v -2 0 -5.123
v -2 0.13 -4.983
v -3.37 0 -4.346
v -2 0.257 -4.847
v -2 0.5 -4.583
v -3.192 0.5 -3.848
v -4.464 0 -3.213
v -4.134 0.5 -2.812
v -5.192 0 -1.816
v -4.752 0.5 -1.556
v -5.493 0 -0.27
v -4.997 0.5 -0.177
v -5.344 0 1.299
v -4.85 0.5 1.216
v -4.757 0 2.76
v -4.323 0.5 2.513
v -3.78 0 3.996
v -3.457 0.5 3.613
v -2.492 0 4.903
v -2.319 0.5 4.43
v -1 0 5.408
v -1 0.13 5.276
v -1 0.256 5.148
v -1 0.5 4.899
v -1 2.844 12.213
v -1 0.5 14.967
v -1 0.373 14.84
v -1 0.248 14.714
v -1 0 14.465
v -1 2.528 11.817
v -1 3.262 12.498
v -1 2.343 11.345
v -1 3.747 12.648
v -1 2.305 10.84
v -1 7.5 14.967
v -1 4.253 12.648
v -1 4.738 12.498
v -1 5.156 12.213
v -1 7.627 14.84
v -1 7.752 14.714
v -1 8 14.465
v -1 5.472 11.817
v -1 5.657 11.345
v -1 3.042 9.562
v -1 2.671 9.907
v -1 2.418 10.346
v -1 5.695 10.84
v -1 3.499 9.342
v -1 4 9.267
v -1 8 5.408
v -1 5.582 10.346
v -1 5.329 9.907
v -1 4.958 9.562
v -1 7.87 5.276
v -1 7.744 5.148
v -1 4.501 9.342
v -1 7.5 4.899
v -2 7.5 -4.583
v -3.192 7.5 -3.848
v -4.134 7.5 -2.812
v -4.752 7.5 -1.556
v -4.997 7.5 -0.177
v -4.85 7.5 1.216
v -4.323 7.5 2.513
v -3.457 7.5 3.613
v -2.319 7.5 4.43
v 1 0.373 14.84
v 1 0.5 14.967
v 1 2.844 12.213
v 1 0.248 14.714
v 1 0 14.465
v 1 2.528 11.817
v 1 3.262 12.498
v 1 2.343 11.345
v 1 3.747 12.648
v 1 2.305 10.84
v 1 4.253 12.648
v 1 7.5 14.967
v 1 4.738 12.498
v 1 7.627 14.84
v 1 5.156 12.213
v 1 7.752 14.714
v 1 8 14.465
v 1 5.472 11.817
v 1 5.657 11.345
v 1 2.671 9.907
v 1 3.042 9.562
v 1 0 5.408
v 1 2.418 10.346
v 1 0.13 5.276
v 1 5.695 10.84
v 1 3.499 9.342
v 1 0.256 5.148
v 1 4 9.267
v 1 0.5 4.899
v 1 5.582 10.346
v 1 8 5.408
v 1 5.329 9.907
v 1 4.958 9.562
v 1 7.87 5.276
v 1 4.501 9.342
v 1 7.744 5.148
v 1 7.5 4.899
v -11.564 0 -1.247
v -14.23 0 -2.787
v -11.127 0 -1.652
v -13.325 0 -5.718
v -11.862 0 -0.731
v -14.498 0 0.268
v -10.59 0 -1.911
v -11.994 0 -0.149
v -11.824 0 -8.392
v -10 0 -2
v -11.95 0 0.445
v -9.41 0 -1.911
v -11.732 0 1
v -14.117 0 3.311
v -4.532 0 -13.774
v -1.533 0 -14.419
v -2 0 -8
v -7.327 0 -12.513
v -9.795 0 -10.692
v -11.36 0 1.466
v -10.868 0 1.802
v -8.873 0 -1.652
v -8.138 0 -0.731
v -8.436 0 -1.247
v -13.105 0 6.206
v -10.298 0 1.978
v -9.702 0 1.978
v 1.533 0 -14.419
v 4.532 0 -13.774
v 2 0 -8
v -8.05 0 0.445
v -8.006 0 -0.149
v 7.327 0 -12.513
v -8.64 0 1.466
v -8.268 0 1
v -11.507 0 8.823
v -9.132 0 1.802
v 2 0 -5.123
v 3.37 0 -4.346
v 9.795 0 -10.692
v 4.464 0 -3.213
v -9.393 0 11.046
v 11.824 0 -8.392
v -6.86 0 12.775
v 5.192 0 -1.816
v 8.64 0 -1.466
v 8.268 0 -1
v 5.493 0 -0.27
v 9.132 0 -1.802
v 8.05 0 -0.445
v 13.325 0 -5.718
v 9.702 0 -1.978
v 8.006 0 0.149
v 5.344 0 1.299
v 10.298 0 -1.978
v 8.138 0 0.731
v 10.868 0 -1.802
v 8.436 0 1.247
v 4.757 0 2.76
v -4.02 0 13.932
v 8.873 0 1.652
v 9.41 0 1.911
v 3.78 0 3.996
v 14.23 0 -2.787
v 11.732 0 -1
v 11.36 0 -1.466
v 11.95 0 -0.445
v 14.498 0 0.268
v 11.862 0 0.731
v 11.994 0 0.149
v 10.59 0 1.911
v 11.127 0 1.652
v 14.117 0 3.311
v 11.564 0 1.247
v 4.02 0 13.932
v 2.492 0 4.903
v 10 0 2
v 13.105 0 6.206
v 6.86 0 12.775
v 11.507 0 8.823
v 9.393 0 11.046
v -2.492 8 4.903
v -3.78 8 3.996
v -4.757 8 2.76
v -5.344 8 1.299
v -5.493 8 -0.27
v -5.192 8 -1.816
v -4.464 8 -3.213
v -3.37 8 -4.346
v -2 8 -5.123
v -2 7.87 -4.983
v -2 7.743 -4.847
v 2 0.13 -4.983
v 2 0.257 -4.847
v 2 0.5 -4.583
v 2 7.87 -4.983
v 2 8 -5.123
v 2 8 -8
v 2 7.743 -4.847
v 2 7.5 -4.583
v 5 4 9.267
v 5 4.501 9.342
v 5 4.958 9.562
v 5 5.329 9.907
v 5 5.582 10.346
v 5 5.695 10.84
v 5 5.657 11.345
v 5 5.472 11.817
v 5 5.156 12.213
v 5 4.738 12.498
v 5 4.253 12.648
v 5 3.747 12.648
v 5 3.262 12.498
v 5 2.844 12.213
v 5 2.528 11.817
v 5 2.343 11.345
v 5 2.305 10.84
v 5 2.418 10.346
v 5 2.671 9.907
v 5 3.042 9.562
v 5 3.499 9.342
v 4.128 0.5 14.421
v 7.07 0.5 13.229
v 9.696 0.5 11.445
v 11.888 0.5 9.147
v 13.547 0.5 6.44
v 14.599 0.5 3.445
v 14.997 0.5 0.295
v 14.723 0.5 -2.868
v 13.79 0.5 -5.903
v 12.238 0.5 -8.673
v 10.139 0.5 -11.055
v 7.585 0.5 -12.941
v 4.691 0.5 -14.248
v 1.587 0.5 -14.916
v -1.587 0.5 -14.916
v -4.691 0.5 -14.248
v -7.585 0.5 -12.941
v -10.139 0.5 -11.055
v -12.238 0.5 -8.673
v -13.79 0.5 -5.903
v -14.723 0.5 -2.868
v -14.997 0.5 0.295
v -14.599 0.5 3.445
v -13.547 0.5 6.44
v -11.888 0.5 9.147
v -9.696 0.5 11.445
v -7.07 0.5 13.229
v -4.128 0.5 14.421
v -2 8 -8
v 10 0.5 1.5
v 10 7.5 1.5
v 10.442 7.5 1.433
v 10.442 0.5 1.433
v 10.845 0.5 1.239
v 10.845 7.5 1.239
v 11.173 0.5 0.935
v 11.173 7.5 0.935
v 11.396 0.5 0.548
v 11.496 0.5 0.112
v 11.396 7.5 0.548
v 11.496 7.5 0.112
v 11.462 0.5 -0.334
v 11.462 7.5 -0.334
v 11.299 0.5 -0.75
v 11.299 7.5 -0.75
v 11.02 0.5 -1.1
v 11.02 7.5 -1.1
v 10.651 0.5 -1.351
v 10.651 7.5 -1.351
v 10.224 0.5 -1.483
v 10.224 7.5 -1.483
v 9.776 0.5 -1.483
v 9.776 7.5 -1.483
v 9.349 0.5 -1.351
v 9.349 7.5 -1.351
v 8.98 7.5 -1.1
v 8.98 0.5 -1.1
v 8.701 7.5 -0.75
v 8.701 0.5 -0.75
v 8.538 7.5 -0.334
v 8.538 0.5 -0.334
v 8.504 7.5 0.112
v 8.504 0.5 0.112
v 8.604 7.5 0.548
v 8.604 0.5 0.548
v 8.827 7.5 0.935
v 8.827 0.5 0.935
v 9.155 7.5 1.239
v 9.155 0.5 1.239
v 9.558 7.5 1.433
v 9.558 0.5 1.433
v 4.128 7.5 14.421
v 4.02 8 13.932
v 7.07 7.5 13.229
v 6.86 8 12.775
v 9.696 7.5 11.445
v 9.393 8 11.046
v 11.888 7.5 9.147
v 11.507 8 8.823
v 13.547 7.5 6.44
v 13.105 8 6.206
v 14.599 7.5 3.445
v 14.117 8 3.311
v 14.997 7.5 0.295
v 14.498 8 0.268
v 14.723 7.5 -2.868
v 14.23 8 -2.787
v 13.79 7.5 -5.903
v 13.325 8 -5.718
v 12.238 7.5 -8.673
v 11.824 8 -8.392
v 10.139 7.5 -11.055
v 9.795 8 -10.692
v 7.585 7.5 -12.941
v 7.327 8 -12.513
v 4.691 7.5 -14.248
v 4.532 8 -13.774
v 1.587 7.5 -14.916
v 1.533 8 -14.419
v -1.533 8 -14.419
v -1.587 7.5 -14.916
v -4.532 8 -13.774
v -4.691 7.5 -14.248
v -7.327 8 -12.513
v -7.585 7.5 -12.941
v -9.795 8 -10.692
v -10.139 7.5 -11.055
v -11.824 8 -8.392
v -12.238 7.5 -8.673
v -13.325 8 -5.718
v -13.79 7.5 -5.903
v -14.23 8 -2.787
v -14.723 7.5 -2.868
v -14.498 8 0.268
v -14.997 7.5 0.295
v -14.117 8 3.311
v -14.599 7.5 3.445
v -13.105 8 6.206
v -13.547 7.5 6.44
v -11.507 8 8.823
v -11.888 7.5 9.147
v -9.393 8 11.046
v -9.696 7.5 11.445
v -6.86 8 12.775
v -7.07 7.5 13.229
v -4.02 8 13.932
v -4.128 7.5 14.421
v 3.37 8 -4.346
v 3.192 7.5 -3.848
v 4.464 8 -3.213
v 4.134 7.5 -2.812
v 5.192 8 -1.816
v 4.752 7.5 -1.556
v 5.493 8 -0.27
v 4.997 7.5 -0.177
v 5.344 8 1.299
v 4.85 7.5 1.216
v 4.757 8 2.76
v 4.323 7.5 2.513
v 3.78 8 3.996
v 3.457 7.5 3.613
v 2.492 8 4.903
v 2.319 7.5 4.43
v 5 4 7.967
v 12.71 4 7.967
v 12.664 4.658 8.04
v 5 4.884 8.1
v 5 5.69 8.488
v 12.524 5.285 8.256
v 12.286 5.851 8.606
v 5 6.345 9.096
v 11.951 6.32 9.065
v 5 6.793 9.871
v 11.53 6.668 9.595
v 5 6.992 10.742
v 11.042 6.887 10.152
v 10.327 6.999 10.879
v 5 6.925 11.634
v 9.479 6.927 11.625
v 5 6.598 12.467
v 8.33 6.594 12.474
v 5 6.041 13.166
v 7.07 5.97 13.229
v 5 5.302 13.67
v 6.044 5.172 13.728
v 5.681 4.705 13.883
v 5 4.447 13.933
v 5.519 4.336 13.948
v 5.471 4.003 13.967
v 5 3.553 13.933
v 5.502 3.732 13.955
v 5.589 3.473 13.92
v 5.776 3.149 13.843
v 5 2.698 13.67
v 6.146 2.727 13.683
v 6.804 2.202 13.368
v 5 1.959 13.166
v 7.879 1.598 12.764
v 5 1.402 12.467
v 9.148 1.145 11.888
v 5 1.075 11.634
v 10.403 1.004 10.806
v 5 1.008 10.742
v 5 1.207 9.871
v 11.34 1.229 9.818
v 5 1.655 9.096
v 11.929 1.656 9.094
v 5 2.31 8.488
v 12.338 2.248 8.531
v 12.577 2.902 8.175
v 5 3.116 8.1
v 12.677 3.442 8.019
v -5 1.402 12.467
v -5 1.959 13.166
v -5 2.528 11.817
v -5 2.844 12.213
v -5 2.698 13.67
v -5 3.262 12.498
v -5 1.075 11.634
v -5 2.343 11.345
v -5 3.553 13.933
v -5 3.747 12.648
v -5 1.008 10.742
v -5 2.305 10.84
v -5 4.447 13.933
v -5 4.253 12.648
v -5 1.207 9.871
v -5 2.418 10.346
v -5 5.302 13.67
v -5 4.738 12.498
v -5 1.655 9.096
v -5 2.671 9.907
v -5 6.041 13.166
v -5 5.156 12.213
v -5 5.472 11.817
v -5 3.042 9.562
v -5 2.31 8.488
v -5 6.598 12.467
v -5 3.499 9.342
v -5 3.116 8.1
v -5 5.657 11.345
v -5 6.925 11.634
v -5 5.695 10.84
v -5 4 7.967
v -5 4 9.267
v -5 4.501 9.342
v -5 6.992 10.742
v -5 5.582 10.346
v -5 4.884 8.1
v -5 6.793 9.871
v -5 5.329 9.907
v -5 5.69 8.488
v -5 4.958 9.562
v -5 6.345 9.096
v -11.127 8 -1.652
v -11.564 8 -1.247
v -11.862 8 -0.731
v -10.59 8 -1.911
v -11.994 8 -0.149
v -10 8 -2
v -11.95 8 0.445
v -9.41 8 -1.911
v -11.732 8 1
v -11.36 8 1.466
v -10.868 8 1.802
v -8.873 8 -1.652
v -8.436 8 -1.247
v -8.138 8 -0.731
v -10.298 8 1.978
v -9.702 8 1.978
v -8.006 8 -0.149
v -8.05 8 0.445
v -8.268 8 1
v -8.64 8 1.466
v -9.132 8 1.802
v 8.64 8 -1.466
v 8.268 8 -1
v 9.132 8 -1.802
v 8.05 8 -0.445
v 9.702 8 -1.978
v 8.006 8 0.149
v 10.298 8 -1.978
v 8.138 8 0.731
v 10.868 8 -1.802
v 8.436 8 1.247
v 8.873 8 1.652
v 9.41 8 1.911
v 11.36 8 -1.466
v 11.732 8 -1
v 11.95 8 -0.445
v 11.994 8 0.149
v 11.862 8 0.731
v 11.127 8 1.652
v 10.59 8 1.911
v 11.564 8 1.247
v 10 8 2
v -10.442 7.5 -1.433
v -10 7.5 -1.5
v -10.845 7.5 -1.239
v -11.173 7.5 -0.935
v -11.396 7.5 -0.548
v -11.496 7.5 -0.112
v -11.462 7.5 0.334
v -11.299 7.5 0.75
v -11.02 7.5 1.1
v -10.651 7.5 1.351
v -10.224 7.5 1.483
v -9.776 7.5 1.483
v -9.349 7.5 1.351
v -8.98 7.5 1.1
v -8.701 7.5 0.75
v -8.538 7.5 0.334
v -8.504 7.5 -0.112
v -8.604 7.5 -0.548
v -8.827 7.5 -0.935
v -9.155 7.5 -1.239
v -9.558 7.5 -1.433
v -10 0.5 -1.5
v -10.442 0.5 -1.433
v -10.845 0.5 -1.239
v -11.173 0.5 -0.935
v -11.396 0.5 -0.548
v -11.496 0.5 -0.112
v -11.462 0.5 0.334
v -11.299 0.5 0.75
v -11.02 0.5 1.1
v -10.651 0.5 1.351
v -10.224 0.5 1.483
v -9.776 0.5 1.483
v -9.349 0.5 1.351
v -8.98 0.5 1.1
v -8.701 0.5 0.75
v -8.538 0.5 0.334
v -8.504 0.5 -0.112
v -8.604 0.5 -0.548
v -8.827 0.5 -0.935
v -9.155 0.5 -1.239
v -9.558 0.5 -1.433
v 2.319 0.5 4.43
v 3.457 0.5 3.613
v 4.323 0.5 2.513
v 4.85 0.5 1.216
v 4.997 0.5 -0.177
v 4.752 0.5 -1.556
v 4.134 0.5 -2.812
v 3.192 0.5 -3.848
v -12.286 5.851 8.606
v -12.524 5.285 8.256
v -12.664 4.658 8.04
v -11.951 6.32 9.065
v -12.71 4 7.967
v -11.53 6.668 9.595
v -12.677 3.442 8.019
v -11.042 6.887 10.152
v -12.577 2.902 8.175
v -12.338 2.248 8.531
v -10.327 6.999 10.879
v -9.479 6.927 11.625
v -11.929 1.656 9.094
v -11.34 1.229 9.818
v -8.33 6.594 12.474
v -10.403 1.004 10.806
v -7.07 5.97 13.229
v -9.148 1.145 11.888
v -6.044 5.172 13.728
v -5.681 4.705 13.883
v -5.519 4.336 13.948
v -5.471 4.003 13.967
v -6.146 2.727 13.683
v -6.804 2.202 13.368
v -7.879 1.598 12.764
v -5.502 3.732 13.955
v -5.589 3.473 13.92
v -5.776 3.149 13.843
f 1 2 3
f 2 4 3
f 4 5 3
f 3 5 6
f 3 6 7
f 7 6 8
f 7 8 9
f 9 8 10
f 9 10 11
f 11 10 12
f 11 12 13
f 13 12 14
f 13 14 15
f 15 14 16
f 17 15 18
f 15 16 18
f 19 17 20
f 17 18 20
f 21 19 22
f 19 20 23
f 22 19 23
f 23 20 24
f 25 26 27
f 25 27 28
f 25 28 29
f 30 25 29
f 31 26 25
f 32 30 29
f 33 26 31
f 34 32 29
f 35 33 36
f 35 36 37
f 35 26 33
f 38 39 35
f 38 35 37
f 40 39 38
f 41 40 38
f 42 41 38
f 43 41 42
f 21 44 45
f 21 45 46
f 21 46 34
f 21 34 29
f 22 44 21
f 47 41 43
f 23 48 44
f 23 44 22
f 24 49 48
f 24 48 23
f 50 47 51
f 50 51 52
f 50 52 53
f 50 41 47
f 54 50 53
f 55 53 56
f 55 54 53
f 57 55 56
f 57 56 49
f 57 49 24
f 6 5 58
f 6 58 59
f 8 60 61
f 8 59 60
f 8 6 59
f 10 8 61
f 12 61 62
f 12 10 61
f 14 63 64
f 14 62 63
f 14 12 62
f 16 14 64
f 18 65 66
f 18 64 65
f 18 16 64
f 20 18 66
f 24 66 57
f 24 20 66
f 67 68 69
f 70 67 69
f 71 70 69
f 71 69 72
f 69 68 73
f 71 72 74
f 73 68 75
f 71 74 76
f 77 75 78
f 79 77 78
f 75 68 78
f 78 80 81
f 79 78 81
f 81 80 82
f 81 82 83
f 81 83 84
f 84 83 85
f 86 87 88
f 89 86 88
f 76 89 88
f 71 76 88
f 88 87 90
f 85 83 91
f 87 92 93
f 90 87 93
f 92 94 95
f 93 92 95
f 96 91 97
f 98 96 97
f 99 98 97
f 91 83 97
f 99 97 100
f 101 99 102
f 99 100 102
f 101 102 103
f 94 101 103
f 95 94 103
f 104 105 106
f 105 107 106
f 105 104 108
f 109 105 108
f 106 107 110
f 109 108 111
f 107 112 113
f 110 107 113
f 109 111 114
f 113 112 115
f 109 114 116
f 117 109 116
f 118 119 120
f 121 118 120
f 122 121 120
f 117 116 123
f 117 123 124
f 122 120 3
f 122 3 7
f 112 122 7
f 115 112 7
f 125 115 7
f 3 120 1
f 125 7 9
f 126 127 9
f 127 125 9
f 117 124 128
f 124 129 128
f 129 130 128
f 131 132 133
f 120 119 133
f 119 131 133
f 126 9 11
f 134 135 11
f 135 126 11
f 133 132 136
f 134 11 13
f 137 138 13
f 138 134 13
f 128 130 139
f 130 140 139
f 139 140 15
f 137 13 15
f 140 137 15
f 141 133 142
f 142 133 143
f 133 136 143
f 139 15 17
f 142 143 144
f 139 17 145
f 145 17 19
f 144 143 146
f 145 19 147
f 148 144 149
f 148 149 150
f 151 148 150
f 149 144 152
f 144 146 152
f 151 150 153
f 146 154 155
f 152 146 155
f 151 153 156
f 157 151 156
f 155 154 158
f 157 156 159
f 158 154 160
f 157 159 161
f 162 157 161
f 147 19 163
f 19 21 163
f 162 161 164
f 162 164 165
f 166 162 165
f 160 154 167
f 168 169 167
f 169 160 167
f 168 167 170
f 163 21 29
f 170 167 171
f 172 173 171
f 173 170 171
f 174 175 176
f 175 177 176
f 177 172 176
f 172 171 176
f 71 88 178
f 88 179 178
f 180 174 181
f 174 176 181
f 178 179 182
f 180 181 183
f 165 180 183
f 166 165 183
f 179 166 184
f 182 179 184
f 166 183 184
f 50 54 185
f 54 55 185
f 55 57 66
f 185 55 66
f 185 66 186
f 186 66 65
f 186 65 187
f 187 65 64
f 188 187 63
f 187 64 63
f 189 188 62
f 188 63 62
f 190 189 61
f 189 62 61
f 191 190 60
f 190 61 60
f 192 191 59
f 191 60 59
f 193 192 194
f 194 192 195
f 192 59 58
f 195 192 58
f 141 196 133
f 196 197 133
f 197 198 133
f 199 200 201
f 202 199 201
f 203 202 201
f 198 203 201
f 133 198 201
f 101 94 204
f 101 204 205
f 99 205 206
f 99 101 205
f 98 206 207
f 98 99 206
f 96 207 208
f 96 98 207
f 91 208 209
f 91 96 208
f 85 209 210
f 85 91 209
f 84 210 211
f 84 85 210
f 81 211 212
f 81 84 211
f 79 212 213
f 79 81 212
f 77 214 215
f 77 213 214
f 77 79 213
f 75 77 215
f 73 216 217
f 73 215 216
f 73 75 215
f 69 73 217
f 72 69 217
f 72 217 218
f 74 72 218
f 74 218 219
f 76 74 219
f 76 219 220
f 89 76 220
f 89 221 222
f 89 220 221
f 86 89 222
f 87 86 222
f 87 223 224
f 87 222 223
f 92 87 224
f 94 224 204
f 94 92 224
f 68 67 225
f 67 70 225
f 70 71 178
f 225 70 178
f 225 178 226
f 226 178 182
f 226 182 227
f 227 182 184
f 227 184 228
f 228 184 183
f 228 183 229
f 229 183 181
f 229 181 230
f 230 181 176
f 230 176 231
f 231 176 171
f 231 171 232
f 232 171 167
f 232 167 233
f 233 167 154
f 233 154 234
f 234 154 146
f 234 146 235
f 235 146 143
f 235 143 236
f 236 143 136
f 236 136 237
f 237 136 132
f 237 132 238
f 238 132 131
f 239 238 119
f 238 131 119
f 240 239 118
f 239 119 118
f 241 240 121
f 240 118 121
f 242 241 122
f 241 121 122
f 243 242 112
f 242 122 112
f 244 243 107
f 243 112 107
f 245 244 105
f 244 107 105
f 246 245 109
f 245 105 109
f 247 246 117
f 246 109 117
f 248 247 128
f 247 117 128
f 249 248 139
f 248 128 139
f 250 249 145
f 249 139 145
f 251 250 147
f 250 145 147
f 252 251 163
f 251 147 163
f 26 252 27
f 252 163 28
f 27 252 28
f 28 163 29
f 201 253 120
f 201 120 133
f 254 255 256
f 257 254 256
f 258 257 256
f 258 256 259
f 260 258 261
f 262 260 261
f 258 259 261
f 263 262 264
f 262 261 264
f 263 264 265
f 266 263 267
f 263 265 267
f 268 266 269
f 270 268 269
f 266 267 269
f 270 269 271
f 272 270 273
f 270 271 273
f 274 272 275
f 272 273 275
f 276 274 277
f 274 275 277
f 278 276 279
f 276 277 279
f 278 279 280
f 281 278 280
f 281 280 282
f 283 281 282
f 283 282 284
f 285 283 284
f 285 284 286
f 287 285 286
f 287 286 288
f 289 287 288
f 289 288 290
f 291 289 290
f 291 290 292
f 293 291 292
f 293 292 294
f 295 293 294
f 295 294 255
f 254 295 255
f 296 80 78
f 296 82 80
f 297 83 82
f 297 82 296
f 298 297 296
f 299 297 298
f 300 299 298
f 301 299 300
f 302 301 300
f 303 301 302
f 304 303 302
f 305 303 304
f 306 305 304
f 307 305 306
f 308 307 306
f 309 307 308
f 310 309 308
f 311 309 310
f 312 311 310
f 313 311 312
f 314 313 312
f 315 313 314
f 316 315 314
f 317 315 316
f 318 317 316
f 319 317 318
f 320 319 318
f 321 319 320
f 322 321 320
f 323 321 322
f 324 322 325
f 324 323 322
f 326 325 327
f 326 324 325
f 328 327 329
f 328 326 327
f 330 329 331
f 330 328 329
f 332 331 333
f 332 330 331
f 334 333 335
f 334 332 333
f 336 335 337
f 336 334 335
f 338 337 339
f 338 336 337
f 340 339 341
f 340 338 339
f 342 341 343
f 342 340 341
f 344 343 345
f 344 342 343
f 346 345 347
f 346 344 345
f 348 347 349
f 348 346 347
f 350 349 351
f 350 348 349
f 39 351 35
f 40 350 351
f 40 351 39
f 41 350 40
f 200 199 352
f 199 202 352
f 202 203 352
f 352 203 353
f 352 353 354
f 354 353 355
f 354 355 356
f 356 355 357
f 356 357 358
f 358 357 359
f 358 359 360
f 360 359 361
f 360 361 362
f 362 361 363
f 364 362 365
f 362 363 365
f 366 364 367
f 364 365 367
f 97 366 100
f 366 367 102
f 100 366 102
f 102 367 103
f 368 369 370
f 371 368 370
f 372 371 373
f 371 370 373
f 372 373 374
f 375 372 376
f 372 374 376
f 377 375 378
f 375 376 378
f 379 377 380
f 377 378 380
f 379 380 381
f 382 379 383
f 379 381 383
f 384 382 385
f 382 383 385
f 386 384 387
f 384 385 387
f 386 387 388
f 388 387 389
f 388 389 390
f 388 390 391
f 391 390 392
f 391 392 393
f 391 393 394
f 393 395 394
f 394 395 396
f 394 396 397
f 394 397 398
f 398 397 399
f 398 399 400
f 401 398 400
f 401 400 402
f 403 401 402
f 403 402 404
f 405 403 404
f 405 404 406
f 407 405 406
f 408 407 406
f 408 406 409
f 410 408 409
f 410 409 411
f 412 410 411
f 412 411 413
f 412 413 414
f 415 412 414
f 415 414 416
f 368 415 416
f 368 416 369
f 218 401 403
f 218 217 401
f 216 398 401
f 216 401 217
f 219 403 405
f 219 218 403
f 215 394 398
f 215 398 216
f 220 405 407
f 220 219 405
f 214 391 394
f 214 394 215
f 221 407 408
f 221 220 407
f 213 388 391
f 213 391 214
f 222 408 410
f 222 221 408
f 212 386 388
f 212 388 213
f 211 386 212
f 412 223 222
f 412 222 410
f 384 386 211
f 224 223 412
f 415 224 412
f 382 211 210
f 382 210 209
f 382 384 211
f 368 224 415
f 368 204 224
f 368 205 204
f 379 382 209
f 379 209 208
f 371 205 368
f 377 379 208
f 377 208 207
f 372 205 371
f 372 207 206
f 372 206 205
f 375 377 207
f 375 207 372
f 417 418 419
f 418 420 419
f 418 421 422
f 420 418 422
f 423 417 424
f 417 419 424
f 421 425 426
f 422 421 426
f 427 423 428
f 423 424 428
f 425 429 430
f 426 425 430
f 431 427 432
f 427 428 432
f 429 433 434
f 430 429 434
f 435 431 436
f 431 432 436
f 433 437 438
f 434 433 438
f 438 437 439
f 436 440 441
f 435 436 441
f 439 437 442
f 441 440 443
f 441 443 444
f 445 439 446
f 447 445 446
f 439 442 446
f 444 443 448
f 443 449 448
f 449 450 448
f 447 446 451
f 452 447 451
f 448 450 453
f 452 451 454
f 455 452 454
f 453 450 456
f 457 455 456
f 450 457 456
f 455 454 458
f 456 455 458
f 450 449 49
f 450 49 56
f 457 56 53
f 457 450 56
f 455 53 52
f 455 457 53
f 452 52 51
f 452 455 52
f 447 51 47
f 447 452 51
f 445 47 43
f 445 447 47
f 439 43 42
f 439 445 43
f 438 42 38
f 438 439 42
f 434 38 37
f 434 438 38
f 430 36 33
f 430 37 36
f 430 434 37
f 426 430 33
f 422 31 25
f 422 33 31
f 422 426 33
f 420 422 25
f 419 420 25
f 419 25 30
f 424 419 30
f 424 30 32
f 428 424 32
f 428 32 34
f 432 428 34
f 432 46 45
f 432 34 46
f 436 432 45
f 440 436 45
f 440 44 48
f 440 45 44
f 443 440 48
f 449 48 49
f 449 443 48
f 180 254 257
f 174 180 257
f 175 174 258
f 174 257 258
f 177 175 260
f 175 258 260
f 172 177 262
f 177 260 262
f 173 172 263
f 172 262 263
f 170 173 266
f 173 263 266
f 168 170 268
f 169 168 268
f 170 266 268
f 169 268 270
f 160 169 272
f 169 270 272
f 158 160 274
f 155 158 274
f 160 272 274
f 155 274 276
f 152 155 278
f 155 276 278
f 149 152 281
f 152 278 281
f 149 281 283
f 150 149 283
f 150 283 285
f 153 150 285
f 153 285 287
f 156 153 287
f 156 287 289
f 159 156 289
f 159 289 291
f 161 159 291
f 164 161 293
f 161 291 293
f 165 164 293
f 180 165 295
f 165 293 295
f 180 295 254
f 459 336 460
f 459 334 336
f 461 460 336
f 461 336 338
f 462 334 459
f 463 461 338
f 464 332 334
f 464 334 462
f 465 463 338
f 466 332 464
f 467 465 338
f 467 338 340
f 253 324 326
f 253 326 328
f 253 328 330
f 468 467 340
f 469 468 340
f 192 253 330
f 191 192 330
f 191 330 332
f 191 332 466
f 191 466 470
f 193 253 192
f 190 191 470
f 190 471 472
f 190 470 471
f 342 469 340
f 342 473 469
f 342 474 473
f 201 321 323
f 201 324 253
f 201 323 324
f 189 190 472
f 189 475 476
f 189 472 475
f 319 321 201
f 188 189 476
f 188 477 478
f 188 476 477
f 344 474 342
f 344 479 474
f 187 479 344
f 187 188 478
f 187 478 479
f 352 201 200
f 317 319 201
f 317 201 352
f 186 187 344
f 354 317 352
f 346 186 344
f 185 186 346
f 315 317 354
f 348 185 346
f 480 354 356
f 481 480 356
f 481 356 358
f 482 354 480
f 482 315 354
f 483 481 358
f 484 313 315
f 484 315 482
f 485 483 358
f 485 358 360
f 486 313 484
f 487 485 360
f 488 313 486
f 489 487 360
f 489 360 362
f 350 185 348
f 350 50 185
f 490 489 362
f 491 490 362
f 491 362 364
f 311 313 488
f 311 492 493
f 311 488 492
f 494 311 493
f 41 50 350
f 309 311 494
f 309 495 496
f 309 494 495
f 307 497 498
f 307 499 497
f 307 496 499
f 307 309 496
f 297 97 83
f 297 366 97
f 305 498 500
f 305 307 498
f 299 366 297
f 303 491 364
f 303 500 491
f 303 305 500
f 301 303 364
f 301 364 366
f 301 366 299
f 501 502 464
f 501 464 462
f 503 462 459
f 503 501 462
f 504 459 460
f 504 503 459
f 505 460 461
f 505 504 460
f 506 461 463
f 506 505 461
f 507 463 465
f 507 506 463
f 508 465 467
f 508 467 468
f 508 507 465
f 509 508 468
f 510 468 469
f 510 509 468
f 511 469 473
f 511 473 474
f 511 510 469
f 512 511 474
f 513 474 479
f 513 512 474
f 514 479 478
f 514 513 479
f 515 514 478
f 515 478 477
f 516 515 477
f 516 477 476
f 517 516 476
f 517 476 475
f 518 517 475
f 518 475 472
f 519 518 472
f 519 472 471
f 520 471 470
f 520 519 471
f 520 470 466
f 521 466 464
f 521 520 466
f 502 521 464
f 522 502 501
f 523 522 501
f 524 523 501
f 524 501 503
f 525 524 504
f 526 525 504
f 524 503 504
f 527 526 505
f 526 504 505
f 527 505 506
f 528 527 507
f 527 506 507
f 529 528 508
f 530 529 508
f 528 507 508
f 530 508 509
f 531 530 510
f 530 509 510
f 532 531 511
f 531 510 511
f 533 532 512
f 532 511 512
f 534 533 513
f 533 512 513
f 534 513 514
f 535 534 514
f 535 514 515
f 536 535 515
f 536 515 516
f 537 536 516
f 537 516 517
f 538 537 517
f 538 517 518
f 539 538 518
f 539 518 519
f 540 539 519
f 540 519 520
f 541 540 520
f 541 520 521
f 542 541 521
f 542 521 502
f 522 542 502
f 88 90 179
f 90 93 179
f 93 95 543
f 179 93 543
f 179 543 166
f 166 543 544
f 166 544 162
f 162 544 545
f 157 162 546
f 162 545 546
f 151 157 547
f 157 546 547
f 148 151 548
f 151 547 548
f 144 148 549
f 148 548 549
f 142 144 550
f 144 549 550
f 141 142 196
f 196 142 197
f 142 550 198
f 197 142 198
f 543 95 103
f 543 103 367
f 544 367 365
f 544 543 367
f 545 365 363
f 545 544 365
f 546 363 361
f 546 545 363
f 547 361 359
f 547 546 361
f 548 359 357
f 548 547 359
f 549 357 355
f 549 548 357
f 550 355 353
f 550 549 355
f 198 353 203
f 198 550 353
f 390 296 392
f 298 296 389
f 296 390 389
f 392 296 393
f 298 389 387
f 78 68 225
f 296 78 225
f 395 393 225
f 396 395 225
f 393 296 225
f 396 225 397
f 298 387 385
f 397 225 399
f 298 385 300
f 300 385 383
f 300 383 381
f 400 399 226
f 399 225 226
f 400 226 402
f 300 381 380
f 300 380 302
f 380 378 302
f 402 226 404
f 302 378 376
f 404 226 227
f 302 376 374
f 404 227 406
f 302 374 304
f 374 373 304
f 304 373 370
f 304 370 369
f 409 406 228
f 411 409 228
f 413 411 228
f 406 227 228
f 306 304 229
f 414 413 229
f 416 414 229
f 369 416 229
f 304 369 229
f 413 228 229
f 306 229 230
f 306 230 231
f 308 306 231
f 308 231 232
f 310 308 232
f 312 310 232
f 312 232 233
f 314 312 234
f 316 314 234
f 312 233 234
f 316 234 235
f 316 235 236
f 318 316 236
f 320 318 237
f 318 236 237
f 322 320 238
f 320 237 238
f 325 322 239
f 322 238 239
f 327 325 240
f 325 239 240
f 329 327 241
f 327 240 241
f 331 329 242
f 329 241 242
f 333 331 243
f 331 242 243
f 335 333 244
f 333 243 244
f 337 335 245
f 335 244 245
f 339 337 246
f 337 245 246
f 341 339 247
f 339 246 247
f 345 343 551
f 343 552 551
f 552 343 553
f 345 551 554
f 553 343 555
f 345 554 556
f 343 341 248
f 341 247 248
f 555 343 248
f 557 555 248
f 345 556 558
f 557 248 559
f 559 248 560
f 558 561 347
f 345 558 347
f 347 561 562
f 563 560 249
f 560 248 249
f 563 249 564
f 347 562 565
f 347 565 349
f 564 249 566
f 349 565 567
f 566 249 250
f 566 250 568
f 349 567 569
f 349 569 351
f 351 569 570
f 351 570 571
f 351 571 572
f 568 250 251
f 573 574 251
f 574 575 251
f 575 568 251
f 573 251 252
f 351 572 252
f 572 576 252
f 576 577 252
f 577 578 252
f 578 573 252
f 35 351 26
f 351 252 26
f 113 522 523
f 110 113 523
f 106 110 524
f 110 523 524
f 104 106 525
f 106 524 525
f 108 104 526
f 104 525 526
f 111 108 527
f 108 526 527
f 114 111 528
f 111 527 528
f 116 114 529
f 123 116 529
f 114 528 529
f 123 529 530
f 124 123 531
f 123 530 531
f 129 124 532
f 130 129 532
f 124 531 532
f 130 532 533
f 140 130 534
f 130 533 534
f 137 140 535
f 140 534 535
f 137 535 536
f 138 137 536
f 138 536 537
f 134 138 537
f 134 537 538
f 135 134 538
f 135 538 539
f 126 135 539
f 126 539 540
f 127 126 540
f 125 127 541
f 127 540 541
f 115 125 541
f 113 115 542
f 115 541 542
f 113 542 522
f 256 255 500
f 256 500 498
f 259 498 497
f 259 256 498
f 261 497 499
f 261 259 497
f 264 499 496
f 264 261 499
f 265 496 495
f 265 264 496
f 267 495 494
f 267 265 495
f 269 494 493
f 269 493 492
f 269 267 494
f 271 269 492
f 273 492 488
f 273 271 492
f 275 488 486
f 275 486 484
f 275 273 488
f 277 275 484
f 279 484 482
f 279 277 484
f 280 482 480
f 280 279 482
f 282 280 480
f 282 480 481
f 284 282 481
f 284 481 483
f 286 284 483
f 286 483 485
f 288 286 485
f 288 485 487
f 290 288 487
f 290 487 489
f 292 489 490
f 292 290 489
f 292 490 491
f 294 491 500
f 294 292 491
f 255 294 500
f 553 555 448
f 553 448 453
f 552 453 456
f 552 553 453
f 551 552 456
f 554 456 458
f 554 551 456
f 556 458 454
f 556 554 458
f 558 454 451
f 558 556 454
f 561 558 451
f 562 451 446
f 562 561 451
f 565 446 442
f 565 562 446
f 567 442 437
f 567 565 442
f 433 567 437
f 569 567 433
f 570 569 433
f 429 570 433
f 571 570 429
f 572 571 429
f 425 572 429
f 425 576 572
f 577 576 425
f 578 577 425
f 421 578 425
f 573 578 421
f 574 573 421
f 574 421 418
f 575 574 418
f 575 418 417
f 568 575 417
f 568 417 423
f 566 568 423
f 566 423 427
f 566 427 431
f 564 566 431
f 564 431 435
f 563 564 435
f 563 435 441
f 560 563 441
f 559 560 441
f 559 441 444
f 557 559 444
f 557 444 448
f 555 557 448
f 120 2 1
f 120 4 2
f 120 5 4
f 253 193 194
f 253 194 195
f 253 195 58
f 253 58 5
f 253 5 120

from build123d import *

# Parameters (mm, degrees)
SKETCH_1_R               = 15
SKETCH_1_R_2             = 5
EXTRUDE_1_DEPTH          = 8
SKETCH_2_W               = 4
SKETCH_2_H               = 4
CUT_EXTRUDE_1_DEPTH      = 23.671568098
SKETCH_3_W               = 2
SKETCH_3_H               = 20
CUT_EXTRUDE_2_DEPTH      = 23.671568098
CUT_EXTRUDE_3_DEPTH      = 23.671568098
CUT_EXTRUDE_3_DEPTH_BACK = 23.671568098
SKETCH_4_R               = 1.7
SKETCH_5_R               = 3
CUT_EXTRUDE_4_DEPTH      = 10
SKETCH_6_R               = 1.5
CUT_EXTRUDE_5_DEPTH      = 23.671568265
CHAMFER_1_SIZE           = 0.5


with BuildPart() as part:
    # 草图1 → 凸台-拉伸1 (new body)
    with BuildSketch(Plane(origin=(0, 0, 0), x_dir=(1, 0, 0), z_dir=(0, 1, 0))):
        with Locations(Location((0, 0, 0), (0, 0, 270))):
            Circle(SKETCH_1_R)
        with Locations(Location((0, 0, 0), (0, 0, 270))):
            Circle(SKETCH_1_R_2, mode=Mode.SUBTRACT)
    extrude(amount=EXTRUDE_1_DEPTH)

    # 草图2 → 切除-拉伸1 (cut, through all)
    with BuildSketch(Plane(origin=(0, 8, 0), x_dir=(1, 0, 0), z_dir=(0, 1, 0))):
        with Locations((0, 6)):
            Rectangle(SKETCH_2_W, SKETCH_2_H)
    extrude(amount=-CUT_EXTRUDE_1_DEPTH, mode=Mode.SUBTRACT)

    # 草图3 → 切除-拉伸2 (cut, through all)
    with BuildSketch(Plane(origin=(0, 8, 0), x_dir=(1, 0, 0), z_dir=(0, 1, 0))):
        with Locations((0, -5)):
            Rectangle(SKETCH_3_W, SKETCH_3_H)
    extrude(amount=-CUT_EXTRUDE_2_DEPTH, mode=Mode.SUBTRACT)

    # 草图4 → 切除-拉伸3 (cut, two sides: drawn at the far end of the back side and taken through both)
    with BuildSketch(Plane(origin=(0, 0, 0), x_dir=(0, 0, -1), z_dir=(1, 0, 0)).offset(-CUT_EXTRUDE_3_DEPTH_BACK)):
        with Locations((-10.966629547, 4)):
            Circle(SKETCH_4_R)
    extrude(amount=CUT_EXTRUDE_3_DEPTH + CUT_EXTRUDE_3_DEPTH_BACK, mode=Mode.SUBTRACT)

    # 草图5 → 切除-拉伸4 (cut)
    with BuildSketch(Plane(origin=(15, 0, 0), x_dir=(0, 0, -1), z_dir=(1, 0, 0))):
        with Locations((-10.966629547, 4)):
            Circle(SKETCH_5_R)
    cut_extrude_4 = extrude(amount=-CUT_EXTRUDE_4_DEPTH, mode=Mode.SUBTRACT)

    # 镜向1: 切除-拉伸4 across plane
    add(cut_extrude_4.mirror(Plane(origin=(0, 0, 0), x_dir=(0, 0, 1), z_dir=(1, 0, 0))), mode=Mode.SUBTRACT)

    # 草图6 → 切除-拉伸5 (cut, through all)
    with BuildSketch(Plane(origin=(0, 8, 0), x_dir=(1, 0, 0), z_dir=(0, 1, 0))):
        with Locations(Location((10, 0, 0), (0, 0, 270))):
            Circle(SKETCH_6_R)
        with Locations(Location((-10, 0, 0), (0, 0, 90))):
            Circle(SKETCH_6_R)
    extrude(amount=-CUT_EXTRUDE_5_DEPTH, mode=Mode.SUBTRACT)

    # 倒角1
    chamfer_1_edges = [part.edges().sort_by_distance(p)[0] for p in [
        (-4.972421157, 0, 0.524430968),
        (4.972421157, 0, 0.524430968),
        (4.972421157, 8, 0.524430968),
        (0, 8, -15),
        (0, 0, -15),
        (10, 0, -1.5),
        (10, 8, -1.5),
        (-10, 0, 1.5),
        (-10, 8, 1.5),
        (-4.972421157, 8, 0.524430968),
    ]]
    chamfer(chamfer_1_edges, length=CHAMFER_1_SIZE)


solid = part.part
